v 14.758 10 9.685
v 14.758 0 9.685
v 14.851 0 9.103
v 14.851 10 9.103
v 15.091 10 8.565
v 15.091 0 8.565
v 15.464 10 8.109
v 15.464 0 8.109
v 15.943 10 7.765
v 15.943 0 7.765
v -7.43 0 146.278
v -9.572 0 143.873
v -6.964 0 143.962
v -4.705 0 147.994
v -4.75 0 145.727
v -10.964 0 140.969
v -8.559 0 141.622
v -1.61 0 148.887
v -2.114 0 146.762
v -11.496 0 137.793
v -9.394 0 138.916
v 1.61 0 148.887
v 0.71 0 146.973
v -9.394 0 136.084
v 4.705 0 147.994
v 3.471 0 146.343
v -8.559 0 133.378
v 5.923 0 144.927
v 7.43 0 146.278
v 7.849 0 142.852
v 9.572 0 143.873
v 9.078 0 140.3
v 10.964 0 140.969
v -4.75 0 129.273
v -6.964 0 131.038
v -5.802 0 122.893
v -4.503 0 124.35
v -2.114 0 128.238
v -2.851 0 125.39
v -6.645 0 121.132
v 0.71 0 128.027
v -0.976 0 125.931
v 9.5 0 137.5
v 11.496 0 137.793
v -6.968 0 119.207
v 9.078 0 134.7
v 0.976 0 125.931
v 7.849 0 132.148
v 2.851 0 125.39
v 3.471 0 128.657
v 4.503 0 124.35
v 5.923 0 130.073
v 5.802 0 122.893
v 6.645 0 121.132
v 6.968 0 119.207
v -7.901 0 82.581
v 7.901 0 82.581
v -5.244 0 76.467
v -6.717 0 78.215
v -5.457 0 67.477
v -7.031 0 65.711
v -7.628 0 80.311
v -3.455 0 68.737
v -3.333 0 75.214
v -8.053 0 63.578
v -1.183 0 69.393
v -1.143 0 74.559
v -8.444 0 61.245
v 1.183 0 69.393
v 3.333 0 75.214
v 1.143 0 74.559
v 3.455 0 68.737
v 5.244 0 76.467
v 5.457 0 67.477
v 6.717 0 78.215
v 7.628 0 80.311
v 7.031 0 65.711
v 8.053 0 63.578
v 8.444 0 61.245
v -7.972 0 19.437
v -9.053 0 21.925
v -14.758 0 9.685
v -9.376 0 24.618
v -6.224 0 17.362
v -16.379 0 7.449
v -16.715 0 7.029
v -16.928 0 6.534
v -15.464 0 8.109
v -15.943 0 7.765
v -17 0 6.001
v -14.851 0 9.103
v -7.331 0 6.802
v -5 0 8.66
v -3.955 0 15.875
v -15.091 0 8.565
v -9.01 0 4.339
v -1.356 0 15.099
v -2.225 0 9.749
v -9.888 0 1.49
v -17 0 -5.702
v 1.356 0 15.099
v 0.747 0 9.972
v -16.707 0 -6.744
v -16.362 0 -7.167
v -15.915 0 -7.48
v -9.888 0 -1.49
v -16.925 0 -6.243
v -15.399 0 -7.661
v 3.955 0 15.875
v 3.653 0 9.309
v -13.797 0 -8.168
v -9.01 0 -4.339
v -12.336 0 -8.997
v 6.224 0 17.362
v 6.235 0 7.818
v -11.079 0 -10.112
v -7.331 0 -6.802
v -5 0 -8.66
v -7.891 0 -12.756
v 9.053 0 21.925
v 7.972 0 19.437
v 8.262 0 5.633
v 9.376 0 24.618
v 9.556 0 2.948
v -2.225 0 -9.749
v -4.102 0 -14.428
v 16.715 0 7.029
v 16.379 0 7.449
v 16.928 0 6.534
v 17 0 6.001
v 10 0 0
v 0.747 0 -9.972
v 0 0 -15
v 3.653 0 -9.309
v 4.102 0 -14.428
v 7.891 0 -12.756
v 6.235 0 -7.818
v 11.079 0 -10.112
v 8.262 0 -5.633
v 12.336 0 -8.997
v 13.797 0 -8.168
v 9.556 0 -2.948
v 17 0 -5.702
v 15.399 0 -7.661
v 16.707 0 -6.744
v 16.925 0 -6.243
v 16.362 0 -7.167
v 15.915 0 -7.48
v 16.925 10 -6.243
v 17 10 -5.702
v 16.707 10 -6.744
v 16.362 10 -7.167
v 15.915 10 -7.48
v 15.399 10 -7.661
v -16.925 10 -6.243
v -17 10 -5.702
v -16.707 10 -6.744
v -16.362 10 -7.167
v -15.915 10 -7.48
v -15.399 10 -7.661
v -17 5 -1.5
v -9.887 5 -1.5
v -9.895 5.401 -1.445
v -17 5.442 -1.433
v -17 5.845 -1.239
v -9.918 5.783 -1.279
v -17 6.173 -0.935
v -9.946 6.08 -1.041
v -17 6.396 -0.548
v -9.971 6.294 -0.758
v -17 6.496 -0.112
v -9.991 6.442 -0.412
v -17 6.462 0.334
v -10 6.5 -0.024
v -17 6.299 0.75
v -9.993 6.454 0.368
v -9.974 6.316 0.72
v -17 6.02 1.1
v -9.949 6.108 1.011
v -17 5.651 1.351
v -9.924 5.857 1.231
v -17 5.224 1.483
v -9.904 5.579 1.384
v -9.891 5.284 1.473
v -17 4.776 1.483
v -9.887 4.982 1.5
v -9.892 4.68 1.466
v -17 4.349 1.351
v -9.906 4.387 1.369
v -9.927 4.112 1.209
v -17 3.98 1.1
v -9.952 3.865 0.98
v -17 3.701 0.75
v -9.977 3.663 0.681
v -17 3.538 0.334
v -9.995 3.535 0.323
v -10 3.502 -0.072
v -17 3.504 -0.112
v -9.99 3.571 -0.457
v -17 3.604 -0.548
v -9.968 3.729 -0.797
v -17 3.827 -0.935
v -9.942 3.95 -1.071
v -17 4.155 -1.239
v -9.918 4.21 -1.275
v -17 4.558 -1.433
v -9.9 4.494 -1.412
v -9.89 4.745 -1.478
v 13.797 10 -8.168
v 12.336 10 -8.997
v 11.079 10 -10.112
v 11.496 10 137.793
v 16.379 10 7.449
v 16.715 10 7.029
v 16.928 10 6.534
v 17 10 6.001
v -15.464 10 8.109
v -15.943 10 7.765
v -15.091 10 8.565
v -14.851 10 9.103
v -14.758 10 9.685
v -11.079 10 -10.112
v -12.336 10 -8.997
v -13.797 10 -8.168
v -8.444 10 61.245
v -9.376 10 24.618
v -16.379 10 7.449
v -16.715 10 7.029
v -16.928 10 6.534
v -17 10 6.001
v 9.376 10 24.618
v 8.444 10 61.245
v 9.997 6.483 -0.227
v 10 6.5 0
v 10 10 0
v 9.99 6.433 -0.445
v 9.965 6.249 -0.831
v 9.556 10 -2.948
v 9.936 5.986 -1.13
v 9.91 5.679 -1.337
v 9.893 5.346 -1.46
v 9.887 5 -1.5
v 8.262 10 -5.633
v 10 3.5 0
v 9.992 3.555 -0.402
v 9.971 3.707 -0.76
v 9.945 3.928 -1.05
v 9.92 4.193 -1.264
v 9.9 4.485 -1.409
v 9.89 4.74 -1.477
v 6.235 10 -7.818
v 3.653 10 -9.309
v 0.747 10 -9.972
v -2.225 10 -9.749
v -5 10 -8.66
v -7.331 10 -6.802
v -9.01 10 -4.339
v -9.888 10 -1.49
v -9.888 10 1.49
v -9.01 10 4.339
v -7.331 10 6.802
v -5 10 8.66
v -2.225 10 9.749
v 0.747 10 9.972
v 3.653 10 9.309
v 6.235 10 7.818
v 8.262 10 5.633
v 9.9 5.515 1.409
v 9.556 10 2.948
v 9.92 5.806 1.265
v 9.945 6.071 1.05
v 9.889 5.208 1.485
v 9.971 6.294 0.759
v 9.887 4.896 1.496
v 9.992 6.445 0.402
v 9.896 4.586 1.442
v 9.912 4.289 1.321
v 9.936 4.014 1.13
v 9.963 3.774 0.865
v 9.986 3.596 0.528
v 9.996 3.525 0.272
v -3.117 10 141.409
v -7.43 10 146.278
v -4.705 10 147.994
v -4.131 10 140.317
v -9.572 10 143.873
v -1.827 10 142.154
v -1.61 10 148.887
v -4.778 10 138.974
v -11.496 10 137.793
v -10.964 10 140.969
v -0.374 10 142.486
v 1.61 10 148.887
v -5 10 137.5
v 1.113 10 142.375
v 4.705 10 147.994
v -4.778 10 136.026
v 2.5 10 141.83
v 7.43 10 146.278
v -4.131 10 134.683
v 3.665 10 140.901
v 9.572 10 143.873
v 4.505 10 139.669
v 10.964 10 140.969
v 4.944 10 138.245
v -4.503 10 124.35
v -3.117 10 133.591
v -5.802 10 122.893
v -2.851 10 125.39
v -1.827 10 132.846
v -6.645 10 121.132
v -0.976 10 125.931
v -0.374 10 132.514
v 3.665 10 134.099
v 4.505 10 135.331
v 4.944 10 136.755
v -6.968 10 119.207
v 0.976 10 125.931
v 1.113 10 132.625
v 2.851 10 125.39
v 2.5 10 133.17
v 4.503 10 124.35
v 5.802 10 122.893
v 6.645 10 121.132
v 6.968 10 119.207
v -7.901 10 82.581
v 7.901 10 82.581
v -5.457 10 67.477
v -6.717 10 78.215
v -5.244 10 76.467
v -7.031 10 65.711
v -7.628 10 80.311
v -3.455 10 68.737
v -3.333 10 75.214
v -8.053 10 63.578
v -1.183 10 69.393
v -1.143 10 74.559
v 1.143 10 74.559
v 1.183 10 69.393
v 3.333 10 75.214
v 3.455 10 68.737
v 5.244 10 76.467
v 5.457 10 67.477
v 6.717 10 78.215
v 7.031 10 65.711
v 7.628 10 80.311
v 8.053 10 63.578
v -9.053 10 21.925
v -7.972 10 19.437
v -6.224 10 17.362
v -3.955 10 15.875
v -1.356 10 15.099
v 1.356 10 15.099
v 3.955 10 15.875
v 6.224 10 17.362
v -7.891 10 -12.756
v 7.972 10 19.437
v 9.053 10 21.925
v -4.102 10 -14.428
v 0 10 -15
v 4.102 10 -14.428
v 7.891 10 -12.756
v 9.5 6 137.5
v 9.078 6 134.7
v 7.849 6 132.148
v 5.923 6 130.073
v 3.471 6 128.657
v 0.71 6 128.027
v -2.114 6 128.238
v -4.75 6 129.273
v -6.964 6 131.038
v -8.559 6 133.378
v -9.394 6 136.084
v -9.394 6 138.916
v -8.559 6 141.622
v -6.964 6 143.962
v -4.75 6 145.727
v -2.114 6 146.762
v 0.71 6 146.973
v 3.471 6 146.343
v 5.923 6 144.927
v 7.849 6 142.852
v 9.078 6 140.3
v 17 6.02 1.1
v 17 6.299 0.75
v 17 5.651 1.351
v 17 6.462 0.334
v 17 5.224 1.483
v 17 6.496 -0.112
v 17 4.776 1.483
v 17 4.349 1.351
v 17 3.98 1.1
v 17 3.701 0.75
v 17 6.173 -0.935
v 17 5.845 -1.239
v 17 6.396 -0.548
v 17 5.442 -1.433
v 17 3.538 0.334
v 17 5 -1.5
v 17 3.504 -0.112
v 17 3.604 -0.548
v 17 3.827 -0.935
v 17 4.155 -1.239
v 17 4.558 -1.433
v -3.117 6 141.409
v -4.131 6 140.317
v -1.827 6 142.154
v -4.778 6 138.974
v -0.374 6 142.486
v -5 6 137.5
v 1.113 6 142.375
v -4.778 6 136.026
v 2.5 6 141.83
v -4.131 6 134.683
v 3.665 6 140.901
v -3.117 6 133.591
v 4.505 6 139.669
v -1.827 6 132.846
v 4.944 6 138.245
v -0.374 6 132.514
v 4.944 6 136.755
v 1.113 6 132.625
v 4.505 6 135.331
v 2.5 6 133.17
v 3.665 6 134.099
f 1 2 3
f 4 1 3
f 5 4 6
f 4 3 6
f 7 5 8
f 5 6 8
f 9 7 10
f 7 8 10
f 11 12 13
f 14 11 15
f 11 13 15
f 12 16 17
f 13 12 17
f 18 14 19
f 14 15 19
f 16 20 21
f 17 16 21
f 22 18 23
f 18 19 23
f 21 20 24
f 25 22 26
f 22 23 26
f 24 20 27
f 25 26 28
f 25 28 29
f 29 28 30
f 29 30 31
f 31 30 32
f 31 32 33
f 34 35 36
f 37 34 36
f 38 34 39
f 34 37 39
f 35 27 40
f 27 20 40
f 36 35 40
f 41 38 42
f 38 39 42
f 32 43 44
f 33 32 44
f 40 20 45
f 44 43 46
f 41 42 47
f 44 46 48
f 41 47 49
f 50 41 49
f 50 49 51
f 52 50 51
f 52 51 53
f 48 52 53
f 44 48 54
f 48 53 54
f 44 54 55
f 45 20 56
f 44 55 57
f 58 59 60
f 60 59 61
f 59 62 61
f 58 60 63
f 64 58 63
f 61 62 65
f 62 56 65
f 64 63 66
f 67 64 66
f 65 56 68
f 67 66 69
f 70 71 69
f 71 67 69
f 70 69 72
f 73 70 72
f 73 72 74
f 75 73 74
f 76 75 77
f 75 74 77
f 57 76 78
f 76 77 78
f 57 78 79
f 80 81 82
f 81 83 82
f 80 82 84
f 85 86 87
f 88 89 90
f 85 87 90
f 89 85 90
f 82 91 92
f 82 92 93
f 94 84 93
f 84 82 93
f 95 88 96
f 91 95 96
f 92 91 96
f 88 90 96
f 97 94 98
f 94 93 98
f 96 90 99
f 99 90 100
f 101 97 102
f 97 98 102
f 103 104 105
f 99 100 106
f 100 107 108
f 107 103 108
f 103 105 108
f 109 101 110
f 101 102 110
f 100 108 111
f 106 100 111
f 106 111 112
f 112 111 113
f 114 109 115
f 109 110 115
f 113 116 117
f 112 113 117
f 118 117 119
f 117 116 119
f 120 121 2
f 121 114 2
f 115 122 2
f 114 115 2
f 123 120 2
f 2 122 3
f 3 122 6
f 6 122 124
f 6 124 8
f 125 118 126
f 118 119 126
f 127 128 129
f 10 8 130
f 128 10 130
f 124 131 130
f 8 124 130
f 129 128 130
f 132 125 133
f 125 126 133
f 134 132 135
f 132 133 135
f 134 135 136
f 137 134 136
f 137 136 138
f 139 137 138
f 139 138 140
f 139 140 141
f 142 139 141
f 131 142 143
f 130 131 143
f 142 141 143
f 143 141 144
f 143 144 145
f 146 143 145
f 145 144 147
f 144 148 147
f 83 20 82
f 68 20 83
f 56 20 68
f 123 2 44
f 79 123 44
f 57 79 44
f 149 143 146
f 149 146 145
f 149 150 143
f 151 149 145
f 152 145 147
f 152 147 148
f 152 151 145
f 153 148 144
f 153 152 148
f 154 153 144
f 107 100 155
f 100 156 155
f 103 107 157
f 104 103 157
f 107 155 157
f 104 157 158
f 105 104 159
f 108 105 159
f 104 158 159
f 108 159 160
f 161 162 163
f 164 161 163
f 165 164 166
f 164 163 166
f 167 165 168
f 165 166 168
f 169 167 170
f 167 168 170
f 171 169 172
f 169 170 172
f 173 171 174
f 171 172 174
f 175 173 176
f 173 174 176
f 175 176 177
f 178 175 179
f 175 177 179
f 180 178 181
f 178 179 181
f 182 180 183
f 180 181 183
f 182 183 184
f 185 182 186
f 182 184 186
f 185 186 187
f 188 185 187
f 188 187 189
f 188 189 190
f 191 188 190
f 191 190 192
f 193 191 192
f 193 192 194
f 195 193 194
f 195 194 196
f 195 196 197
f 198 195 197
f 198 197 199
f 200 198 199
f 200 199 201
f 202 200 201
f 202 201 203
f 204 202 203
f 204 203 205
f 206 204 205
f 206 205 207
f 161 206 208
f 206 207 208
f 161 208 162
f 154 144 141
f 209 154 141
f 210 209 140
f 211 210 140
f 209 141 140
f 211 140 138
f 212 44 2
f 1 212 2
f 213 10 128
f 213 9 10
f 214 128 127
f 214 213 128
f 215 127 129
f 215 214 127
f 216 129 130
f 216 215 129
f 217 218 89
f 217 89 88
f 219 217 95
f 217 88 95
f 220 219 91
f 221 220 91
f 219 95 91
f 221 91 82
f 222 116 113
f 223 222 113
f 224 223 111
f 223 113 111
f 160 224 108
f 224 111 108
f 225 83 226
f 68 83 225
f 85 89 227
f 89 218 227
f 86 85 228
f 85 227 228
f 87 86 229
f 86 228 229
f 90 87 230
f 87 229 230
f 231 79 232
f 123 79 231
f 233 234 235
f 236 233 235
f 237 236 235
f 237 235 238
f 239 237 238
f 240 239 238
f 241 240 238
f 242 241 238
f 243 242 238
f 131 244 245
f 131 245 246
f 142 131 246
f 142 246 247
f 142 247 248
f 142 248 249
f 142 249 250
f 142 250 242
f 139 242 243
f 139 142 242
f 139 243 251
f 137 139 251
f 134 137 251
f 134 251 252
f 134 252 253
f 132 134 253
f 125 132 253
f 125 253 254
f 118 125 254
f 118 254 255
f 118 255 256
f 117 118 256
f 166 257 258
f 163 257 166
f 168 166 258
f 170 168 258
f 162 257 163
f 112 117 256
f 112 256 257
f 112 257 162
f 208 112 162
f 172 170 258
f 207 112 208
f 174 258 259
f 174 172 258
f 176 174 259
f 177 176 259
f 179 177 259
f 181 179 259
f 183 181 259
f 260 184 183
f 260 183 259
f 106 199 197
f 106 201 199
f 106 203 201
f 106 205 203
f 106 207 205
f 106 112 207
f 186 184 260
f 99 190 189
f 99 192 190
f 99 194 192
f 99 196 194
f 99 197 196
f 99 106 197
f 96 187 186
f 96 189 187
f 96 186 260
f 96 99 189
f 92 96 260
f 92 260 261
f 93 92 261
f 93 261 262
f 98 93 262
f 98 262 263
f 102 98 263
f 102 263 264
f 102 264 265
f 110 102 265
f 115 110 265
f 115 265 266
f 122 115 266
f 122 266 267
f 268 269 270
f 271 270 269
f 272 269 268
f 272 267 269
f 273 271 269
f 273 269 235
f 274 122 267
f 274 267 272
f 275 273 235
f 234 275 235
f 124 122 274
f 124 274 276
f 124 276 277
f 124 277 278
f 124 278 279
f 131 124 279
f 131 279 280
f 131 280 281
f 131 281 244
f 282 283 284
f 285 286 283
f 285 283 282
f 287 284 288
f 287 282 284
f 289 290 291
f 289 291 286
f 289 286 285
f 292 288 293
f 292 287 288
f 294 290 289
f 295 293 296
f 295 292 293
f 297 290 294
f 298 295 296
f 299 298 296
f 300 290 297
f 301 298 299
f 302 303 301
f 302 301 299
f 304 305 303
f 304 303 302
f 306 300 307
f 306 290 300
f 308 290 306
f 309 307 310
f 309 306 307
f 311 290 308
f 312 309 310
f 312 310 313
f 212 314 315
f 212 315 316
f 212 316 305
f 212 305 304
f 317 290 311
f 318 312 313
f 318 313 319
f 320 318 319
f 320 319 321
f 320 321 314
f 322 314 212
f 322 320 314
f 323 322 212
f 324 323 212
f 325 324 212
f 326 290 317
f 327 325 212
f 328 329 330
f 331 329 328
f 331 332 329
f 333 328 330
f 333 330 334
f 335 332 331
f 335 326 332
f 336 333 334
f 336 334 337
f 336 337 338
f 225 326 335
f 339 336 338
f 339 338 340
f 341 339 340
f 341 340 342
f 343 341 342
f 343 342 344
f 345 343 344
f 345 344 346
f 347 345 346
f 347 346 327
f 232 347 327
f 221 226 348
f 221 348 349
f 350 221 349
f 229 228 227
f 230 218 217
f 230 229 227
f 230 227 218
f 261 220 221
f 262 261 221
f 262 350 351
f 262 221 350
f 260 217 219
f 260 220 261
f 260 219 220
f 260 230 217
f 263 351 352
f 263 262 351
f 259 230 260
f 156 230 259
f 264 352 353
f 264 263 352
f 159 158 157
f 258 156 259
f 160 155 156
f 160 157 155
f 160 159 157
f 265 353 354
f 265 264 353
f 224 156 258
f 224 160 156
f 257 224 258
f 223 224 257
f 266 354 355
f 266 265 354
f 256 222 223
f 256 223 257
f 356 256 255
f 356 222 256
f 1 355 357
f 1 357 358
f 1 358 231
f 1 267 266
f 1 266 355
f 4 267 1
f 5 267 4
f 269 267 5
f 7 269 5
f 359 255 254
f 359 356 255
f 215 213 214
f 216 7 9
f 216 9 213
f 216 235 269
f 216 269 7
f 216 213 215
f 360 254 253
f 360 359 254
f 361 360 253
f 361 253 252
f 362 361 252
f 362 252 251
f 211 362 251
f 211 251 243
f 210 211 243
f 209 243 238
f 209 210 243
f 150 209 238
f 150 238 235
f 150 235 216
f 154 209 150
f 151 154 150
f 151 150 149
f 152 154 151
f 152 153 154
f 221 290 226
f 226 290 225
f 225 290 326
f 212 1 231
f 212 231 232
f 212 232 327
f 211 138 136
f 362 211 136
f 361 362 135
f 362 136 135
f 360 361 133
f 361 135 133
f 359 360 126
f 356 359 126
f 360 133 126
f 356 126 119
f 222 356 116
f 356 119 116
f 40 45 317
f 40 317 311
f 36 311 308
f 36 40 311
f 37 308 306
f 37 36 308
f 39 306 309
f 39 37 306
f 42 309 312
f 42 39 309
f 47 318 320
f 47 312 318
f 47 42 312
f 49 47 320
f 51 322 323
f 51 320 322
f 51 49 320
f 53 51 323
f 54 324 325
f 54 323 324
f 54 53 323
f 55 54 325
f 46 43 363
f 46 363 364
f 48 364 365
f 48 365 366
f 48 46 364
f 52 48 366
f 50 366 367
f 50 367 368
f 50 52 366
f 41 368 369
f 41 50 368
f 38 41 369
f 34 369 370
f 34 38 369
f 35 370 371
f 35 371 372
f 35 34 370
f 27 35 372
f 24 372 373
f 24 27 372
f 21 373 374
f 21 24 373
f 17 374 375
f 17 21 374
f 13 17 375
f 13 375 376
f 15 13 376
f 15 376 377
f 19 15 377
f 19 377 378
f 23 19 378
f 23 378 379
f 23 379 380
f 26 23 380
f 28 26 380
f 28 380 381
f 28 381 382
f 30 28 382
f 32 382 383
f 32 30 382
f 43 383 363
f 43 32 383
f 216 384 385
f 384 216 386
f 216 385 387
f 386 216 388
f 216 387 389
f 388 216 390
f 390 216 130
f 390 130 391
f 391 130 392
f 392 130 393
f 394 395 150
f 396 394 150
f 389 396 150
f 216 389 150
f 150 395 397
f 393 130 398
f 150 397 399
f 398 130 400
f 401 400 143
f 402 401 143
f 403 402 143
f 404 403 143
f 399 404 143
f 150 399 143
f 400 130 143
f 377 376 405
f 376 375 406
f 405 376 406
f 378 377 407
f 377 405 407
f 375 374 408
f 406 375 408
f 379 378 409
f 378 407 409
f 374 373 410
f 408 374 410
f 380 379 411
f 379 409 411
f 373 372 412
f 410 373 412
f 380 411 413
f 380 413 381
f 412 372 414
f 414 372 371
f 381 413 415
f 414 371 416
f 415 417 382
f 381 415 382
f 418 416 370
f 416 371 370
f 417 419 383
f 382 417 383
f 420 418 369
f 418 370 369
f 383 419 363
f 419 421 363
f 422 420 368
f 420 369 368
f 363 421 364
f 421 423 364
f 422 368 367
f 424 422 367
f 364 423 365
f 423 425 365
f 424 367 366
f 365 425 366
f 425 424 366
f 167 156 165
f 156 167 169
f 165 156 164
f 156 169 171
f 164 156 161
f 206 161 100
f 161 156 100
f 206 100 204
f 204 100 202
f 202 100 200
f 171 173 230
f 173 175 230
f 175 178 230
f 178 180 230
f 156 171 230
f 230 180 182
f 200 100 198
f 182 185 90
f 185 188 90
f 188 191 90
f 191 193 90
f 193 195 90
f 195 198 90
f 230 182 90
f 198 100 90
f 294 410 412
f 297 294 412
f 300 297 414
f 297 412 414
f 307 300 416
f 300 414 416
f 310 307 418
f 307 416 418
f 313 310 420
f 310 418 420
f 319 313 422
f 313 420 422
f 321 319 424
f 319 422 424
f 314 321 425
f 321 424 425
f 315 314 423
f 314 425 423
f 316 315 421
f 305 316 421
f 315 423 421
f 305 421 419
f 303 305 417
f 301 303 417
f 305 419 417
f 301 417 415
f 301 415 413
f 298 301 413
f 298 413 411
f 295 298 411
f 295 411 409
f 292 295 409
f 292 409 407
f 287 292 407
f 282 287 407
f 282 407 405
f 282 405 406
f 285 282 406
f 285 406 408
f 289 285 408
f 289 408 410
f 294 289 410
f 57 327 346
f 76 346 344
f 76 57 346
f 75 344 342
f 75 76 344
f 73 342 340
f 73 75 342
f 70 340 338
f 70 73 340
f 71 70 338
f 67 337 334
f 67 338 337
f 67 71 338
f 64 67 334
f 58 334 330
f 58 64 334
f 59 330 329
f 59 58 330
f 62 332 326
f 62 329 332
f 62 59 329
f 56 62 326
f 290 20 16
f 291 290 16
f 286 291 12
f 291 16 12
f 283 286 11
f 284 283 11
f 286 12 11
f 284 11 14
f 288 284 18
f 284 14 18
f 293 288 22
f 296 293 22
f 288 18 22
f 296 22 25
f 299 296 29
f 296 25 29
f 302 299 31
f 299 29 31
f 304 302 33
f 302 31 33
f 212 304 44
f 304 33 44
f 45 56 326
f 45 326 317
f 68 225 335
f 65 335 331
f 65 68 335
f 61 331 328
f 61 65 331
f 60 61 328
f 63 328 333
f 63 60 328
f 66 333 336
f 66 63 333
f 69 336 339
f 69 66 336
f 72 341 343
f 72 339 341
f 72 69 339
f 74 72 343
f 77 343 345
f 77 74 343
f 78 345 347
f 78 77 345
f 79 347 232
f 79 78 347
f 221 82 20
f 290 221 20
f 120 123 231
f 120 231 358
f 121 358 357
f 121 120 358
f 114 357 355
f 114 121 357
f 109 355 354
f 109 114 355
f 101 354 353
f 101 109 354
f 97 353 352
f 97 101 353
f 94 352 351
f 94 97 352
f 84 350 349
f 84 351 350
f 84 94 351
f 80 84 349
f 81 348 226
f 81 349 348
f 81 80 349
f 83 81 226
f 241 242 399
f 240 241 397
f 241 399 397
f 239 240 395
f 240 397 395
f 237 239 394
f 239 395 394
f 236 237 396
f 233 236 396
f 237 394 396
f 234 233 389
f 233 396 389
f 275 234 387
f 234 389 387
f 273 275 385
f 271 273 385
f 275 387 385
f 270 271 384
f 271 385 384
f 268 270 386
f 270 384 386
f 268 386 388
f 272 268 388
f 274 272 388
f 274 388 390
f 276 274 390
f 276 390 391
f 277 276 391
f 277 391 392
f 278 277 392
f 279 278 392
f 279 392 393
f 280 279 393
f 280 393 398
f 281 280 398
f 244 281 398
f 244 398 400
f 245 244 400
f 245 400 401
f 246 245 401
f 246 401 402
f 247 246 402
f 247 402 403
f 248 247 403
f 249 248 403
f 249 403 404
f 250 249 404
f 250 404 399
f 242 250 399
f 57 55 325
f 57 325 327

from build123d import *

# Parameters (mm, degrees)
SKETCH1_R           = 10
BOSS_EXTRUDE1_DEPTH = 10
SKETCH2_R           = 9.5
CUT_EXTRUDE1_DEPTH  = 6
SKETCH3_R           = 5
CUT_EXTRUDE2_DEPTH  = 11
CUT_EXTRUDE4_DEPTH  = 11
FILLET1_R           = 2
M4_TAPPED_HOLE1_D   = 3


with BuildPart() as part:
    # Sketch1 → Boss-Extrude1 (new body)
    with BuildSketch(Plane(origin=(0, 0, 0), x_dir=(1, 0, 0), z_dir=(0, 1, 0))):
        with BuildLine():
            Line((-14.758244484, -9.68540076), (-11.496273776, -137.792727273))
            ThreePointArc((-11.496273776, -137.792727273), (0, -149), (11.496273776, -137.792727273))
            Line((11.496273776, -137.792727273), (14.758244484, -9.68540076))
            ThreePointArc((14.758244484, -9.68540076), (15.434637081, -8.136753315), (17, -7.5))
            Line((17, -7.5), (17, 7.5))
            ThreePointArc((17, 7.5), (13.764151011, 8.182075624), (11.078928313, 10.112237509))
            ThreePointArc((11.078928313, 10.112237509), (0, 15), (-11.078928313, 10.112237509))
            ThreePointArc((-11.078928313, 10.112237509), (-13.764151011, 8.182075624), (-17, 7.5))
            Line((-17, 7.5), (-17, -7.5))
            ThreePointArc((-17, -7.5), (-15.434637081, -8.136753315), (-14.758244484, -9.68540076))
        make_face()
        Circle(SKETCH1_R, mode=Mode.SUBTRACT)
    extrude(amount=BOSS_EXTRUDE1_DEPTH)

    # Sketch2 → Cut-Extrude1 (cut)
    with BuildSketch(Plane(origin=(0, 0, 0), x_dir=(1, 0, 0), z_dir=(0, 1, 0))):
        with Locations((0, -137.5)):
            Circle(SKETCH2_R)
    extrude(amount=CUT_EXTRUDE1_DEPTH, mode=Mode.SUBTRACT)

    # Sketch3 → Cut-Extrude2 (cut, through all)
    with BuildSketch(Plane(origin=(0, 0, 0), x_dir=(-1, 0, 0), z_dir=(0, -1, 0))):
        with Locations((0, -137.5)):
            Circle(SKETCH3_R)
    extrude(amount=-CUT_EXTRUDE2_DEPTH, mode=Mode.SUBTRACT)

    # Sketch4 → Cut-Extrude4 (cut, through all)
    with BuildSketch(Plane(origin=(0, 0, 0), x_dir=(1, 0, 0), z_dir=(0, 1, 0))):
        with BuildLine():
            Line((-7.90050824, -82.580601653), (-6.96789079, -119.207272727))
            ThreePointArc((-6.96789079, -119.207272727), (0, -126), (6.96789079, -119.207272727))
            Line((6.96789079, -119.207272727), (7.90050824, -82.580601653))
            ThreePointArc((7.90050824, -82.580601653), (0, -74.476363636), (-7.90050824, -82.580601653))
        make_face()
        with BuildLine():
            Line((-9.376393506, -24.618181818), (-8.443776056, -61.244852893))
            ThreePointArc((-8.443776056, -61.244852893), (0, -69.476363636), (8.443776056, -61.244852893))
            Line((8.443776056, -61.244852893), (9.376393506, -24.618181818))
            ThreePointArc((9.376393506, -24.618181818), (0, -15), (-9.376393506, -24.618181818))
        make_face()
    extrude(amount=CUT_EXTRUDE4_DEPTH, mode=Mode.SUBTRACT)

    # Fillet1
    fillet1_edges = [part.edges().sort_by_distance(p)[0] for p in [
        (17, 5, -7.5),
        (17, 5, 7.5),
        (-17, 5, 7.5),
        (-17, 5, -7.5),
    ]]
    fillet(fillet1_edges, radius=FILLET1_R)

    # M4 Tapped Hole1 (through all)
    with Locations(Plane.ZY.offset(17)):
        with Locations((0, 5)):
            Hole(M4_TAPPED_HOLE1_D / 2)


solid = part.part
